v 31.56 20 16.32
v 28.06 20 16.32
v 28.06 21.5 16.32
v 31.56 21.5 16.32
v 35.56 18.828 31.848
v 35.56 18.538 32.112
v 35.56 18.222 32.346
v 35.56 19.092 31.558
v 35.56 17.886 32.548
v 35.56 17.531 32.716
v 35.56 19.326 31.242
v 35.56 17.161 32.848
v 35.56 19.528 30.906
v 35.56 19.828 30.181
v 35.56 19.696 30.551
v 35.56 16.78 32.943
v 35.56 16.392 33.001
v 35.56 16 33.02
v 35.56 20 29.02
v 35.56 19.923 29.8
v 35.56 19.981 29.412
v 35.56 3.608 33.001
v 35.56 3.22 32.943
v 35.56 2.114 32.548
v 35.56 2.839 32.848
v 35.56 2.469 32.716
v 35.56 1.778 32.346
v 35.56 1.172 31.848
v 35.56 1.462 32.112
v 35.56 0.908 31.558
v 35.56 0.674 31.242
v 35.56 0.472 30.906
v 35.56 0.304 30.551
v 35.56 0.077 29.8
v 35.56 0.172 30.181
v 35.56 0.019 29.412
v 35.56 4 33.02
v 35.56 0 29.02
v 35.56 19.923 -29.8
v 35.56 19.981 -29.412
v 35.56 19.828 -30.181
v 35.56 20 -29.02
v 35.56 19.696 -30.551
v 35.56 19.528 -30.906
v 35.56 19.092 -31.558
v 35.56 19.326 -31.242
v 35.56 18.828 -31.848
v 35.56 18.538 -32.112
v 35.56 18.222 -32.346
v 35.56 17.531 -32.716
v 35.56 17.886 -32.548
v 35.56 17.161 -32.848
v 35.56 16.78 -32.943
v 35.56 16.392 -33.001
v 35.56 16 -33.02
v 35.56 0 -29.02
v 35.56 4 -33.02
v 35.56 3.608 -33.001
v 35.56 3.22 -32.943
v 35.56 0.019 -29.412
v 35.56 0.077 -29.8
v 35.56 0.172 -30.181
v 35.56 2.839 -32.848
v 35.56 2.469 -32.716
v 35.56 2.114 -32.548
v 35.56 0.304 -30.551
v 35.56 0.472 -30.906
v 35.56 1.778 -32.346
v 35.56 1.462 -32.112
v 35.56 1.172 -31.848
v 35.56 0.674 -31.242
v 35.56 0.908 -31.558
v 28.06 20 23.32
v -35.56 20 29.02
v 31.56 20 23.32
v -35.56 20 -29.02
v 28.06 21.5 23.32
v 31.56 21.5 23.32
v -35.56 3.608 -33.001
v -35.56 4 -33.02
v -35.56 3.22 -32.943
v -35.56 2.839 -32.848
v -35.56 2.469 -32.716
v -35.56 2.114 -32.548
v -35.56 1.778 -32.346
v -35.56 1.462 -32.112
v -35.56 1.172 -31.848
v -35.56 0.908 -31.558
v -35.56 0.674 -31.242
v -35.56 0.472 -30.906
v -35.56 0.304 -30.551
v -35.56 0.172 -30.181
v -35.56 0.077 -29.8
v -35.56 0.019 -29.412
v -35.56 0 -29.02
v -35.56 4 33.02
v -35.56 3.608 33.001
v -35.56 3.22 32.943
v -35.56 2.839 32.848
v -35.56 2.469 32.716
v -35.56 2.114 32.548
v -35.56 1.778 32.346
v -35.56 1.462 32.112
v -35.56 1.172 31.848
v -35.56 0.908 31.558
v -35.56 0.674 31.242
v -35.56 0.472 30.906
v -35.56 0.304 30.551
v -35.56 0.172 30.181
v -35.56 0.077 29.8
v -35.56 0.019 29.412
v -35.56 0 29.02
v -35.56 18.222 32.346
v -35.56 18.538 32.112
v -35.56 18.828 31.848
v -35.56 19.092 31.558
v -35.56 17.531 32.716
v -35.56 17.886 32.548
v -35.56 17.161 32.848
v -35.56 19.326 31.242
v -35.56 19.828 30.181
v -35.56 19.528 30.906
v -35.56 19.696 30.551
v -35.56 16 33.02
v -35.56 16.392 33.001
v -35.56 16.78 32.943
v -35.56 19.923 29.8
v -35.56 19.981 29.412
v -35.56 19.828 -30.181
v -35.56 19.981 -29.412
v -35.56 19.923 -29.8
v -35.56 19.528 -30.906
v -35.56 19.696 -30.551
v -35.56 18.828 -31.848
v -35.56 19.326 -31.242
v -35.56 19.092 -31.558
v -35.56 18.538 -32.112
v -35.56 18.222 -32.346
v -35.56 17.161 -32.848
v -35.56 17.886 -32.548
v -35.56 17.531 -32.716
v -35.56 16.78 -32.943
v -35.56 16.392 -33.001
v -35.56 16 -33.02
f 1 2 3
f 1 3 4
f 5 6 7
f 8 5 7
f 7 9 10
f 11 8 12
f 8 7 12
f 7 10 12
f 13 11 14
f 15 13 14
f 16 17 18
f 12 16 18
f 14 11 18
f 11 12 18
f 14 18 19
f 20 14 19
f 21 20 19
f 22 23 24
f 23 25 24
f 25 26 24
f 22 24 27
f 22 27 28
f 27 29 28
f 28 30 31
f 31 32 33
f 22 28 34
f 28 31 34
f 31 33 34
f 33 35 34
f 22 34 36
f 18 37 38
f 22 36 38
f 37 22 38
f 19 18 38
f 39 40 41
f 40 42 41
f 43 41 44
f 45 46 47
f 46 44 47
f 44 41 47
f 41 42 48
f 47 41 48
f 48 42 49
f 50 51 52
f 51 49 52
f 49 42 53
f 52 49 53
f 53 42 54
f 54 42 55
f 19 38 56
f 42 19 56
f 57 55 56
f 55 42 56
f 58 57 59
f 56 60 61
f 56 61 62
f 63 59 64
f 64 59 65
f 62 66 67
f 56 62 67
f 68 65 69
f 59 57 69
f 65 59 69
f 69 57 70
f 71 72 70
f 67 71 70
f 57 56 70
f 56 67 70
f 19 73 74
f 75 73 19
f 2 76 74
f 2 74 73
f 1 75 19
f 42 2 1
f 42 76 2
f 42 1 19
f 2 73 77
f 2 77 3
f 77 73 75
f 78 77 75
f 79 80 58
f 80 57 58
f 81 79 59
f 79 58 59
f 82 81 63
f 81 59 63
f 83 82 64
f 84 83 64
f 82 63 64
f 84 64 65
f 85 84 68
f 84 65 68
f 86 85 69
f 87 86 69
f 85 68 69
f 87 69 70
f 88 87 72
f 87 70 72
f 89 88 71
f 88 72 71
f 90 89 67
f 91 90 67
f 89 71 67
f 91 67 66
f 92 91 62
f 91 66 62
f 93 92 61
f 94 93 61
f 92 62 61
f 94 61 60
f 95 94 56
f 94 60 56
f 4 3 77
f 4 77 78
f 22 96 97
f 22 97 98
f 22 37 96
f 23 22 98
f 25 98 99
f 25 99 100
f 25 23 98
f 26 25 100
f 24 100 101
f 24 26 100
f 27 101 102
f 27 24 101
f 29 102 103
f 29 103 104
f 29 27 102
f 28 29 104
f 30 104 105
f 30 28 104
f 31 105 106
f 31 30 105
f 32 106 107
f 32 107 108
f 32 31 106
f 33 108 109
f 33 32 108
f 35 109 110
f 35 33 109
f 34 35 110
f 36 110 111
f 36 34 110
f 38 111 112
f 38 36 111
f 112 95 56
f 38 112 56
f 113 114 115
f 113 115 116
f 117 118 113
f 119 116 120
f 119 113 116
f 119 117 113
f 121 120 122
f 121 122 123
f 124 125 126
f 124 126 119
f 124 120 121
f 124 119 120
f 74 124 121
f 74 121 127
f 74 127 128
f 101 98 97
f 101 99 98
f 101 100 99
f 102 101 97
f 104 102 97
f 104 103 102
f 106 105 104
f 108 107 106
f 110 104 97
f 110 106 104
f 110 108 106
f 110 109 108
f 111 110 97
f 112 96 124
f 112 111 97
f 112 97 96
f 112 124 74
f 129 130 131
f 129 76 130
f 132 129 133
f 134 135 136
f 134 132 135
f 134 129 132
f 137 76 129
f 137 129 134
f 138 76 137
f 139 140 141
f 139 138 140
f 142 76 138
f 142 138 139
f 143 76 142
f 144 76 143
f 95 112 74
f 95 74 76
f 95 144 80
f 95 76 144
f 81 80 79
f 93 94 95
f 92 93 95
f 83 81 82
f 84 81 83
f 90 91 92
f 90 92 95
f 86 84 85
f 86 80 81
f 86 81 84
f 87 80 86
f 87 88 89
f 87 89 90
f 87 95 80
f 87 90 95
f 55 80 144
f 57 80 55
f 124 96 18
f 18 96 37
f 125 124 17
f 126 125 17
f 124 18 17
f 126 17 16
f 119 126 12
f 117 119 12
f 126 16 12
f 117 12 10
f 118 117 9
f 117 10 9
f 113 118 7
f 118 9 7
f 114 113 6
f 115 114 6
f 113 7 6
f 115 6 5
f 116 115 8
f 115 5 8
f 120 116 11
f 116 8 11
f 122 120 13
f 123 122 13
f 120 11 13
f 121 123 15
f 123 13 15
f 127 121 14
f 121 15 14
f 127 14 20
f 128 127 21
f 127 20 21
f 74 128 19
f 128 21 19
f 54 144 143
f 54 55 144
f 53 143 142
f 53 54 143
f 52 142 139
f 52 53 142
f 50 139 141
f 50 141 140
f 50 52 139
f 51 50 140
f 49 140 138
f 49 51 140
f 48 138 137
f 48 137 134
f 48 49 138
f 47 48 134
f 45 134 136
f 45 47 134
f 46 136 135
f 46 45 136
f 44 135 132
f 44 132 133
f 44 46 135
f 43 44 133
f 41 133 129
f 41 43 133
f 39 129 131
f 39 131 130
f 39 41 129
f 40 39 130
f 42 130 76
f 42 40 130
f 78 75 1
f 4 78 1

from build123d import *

# Parameters (mm, degrees)
SKETCH1_W           = 71.12
SKETCH1_H           = 66.04
BOSS_EXTRUDE1_DEPTH = 20
FILLET1_R           = 4
SKETCH2_W           = 3.5
SKETCH2_H           = 7
BOSS_EXTRUDE2_DEPTH = 1.5


with BuildPart() as part:
    # Sketch1 → Boss-Extrude1 (new body)
    with BuildSketch(Plane(origin=(0, 0, 0), x_dir=(1, 0, 0), z_dir=(0, 1, 0))):
        Rectangle(SKETCH1_W, SKETCH1_H)
    extrude(amount=BOSS_EXTRUDE1_DEPTH)

    # Fillet1
    fillet1_edges = [part.edges().sort_by_distance(p)[0] for p in [
        (0, 20, 33.02),
        (0, 0, 33.02),
        (0, 0, -33.02),
        (0, 20, -33.02),
    ]]
    fillet(fillet1_edges, radius=FILLET1_R)

    # Sketch2 → Boss-Extrude2 (add)
    with BuildSketch(Plane(origin=(0, 20, 0), x_dir=(1, 0, 0), z_dir=(0, 1, 0))):
        with Locations((29.81, -19.82)):
            Rectangle(SKETCH2_W, SKETCH2_H)
    extrude(amount=BOSS_EXTRUDE2_DEPTH)


solid = part.part
